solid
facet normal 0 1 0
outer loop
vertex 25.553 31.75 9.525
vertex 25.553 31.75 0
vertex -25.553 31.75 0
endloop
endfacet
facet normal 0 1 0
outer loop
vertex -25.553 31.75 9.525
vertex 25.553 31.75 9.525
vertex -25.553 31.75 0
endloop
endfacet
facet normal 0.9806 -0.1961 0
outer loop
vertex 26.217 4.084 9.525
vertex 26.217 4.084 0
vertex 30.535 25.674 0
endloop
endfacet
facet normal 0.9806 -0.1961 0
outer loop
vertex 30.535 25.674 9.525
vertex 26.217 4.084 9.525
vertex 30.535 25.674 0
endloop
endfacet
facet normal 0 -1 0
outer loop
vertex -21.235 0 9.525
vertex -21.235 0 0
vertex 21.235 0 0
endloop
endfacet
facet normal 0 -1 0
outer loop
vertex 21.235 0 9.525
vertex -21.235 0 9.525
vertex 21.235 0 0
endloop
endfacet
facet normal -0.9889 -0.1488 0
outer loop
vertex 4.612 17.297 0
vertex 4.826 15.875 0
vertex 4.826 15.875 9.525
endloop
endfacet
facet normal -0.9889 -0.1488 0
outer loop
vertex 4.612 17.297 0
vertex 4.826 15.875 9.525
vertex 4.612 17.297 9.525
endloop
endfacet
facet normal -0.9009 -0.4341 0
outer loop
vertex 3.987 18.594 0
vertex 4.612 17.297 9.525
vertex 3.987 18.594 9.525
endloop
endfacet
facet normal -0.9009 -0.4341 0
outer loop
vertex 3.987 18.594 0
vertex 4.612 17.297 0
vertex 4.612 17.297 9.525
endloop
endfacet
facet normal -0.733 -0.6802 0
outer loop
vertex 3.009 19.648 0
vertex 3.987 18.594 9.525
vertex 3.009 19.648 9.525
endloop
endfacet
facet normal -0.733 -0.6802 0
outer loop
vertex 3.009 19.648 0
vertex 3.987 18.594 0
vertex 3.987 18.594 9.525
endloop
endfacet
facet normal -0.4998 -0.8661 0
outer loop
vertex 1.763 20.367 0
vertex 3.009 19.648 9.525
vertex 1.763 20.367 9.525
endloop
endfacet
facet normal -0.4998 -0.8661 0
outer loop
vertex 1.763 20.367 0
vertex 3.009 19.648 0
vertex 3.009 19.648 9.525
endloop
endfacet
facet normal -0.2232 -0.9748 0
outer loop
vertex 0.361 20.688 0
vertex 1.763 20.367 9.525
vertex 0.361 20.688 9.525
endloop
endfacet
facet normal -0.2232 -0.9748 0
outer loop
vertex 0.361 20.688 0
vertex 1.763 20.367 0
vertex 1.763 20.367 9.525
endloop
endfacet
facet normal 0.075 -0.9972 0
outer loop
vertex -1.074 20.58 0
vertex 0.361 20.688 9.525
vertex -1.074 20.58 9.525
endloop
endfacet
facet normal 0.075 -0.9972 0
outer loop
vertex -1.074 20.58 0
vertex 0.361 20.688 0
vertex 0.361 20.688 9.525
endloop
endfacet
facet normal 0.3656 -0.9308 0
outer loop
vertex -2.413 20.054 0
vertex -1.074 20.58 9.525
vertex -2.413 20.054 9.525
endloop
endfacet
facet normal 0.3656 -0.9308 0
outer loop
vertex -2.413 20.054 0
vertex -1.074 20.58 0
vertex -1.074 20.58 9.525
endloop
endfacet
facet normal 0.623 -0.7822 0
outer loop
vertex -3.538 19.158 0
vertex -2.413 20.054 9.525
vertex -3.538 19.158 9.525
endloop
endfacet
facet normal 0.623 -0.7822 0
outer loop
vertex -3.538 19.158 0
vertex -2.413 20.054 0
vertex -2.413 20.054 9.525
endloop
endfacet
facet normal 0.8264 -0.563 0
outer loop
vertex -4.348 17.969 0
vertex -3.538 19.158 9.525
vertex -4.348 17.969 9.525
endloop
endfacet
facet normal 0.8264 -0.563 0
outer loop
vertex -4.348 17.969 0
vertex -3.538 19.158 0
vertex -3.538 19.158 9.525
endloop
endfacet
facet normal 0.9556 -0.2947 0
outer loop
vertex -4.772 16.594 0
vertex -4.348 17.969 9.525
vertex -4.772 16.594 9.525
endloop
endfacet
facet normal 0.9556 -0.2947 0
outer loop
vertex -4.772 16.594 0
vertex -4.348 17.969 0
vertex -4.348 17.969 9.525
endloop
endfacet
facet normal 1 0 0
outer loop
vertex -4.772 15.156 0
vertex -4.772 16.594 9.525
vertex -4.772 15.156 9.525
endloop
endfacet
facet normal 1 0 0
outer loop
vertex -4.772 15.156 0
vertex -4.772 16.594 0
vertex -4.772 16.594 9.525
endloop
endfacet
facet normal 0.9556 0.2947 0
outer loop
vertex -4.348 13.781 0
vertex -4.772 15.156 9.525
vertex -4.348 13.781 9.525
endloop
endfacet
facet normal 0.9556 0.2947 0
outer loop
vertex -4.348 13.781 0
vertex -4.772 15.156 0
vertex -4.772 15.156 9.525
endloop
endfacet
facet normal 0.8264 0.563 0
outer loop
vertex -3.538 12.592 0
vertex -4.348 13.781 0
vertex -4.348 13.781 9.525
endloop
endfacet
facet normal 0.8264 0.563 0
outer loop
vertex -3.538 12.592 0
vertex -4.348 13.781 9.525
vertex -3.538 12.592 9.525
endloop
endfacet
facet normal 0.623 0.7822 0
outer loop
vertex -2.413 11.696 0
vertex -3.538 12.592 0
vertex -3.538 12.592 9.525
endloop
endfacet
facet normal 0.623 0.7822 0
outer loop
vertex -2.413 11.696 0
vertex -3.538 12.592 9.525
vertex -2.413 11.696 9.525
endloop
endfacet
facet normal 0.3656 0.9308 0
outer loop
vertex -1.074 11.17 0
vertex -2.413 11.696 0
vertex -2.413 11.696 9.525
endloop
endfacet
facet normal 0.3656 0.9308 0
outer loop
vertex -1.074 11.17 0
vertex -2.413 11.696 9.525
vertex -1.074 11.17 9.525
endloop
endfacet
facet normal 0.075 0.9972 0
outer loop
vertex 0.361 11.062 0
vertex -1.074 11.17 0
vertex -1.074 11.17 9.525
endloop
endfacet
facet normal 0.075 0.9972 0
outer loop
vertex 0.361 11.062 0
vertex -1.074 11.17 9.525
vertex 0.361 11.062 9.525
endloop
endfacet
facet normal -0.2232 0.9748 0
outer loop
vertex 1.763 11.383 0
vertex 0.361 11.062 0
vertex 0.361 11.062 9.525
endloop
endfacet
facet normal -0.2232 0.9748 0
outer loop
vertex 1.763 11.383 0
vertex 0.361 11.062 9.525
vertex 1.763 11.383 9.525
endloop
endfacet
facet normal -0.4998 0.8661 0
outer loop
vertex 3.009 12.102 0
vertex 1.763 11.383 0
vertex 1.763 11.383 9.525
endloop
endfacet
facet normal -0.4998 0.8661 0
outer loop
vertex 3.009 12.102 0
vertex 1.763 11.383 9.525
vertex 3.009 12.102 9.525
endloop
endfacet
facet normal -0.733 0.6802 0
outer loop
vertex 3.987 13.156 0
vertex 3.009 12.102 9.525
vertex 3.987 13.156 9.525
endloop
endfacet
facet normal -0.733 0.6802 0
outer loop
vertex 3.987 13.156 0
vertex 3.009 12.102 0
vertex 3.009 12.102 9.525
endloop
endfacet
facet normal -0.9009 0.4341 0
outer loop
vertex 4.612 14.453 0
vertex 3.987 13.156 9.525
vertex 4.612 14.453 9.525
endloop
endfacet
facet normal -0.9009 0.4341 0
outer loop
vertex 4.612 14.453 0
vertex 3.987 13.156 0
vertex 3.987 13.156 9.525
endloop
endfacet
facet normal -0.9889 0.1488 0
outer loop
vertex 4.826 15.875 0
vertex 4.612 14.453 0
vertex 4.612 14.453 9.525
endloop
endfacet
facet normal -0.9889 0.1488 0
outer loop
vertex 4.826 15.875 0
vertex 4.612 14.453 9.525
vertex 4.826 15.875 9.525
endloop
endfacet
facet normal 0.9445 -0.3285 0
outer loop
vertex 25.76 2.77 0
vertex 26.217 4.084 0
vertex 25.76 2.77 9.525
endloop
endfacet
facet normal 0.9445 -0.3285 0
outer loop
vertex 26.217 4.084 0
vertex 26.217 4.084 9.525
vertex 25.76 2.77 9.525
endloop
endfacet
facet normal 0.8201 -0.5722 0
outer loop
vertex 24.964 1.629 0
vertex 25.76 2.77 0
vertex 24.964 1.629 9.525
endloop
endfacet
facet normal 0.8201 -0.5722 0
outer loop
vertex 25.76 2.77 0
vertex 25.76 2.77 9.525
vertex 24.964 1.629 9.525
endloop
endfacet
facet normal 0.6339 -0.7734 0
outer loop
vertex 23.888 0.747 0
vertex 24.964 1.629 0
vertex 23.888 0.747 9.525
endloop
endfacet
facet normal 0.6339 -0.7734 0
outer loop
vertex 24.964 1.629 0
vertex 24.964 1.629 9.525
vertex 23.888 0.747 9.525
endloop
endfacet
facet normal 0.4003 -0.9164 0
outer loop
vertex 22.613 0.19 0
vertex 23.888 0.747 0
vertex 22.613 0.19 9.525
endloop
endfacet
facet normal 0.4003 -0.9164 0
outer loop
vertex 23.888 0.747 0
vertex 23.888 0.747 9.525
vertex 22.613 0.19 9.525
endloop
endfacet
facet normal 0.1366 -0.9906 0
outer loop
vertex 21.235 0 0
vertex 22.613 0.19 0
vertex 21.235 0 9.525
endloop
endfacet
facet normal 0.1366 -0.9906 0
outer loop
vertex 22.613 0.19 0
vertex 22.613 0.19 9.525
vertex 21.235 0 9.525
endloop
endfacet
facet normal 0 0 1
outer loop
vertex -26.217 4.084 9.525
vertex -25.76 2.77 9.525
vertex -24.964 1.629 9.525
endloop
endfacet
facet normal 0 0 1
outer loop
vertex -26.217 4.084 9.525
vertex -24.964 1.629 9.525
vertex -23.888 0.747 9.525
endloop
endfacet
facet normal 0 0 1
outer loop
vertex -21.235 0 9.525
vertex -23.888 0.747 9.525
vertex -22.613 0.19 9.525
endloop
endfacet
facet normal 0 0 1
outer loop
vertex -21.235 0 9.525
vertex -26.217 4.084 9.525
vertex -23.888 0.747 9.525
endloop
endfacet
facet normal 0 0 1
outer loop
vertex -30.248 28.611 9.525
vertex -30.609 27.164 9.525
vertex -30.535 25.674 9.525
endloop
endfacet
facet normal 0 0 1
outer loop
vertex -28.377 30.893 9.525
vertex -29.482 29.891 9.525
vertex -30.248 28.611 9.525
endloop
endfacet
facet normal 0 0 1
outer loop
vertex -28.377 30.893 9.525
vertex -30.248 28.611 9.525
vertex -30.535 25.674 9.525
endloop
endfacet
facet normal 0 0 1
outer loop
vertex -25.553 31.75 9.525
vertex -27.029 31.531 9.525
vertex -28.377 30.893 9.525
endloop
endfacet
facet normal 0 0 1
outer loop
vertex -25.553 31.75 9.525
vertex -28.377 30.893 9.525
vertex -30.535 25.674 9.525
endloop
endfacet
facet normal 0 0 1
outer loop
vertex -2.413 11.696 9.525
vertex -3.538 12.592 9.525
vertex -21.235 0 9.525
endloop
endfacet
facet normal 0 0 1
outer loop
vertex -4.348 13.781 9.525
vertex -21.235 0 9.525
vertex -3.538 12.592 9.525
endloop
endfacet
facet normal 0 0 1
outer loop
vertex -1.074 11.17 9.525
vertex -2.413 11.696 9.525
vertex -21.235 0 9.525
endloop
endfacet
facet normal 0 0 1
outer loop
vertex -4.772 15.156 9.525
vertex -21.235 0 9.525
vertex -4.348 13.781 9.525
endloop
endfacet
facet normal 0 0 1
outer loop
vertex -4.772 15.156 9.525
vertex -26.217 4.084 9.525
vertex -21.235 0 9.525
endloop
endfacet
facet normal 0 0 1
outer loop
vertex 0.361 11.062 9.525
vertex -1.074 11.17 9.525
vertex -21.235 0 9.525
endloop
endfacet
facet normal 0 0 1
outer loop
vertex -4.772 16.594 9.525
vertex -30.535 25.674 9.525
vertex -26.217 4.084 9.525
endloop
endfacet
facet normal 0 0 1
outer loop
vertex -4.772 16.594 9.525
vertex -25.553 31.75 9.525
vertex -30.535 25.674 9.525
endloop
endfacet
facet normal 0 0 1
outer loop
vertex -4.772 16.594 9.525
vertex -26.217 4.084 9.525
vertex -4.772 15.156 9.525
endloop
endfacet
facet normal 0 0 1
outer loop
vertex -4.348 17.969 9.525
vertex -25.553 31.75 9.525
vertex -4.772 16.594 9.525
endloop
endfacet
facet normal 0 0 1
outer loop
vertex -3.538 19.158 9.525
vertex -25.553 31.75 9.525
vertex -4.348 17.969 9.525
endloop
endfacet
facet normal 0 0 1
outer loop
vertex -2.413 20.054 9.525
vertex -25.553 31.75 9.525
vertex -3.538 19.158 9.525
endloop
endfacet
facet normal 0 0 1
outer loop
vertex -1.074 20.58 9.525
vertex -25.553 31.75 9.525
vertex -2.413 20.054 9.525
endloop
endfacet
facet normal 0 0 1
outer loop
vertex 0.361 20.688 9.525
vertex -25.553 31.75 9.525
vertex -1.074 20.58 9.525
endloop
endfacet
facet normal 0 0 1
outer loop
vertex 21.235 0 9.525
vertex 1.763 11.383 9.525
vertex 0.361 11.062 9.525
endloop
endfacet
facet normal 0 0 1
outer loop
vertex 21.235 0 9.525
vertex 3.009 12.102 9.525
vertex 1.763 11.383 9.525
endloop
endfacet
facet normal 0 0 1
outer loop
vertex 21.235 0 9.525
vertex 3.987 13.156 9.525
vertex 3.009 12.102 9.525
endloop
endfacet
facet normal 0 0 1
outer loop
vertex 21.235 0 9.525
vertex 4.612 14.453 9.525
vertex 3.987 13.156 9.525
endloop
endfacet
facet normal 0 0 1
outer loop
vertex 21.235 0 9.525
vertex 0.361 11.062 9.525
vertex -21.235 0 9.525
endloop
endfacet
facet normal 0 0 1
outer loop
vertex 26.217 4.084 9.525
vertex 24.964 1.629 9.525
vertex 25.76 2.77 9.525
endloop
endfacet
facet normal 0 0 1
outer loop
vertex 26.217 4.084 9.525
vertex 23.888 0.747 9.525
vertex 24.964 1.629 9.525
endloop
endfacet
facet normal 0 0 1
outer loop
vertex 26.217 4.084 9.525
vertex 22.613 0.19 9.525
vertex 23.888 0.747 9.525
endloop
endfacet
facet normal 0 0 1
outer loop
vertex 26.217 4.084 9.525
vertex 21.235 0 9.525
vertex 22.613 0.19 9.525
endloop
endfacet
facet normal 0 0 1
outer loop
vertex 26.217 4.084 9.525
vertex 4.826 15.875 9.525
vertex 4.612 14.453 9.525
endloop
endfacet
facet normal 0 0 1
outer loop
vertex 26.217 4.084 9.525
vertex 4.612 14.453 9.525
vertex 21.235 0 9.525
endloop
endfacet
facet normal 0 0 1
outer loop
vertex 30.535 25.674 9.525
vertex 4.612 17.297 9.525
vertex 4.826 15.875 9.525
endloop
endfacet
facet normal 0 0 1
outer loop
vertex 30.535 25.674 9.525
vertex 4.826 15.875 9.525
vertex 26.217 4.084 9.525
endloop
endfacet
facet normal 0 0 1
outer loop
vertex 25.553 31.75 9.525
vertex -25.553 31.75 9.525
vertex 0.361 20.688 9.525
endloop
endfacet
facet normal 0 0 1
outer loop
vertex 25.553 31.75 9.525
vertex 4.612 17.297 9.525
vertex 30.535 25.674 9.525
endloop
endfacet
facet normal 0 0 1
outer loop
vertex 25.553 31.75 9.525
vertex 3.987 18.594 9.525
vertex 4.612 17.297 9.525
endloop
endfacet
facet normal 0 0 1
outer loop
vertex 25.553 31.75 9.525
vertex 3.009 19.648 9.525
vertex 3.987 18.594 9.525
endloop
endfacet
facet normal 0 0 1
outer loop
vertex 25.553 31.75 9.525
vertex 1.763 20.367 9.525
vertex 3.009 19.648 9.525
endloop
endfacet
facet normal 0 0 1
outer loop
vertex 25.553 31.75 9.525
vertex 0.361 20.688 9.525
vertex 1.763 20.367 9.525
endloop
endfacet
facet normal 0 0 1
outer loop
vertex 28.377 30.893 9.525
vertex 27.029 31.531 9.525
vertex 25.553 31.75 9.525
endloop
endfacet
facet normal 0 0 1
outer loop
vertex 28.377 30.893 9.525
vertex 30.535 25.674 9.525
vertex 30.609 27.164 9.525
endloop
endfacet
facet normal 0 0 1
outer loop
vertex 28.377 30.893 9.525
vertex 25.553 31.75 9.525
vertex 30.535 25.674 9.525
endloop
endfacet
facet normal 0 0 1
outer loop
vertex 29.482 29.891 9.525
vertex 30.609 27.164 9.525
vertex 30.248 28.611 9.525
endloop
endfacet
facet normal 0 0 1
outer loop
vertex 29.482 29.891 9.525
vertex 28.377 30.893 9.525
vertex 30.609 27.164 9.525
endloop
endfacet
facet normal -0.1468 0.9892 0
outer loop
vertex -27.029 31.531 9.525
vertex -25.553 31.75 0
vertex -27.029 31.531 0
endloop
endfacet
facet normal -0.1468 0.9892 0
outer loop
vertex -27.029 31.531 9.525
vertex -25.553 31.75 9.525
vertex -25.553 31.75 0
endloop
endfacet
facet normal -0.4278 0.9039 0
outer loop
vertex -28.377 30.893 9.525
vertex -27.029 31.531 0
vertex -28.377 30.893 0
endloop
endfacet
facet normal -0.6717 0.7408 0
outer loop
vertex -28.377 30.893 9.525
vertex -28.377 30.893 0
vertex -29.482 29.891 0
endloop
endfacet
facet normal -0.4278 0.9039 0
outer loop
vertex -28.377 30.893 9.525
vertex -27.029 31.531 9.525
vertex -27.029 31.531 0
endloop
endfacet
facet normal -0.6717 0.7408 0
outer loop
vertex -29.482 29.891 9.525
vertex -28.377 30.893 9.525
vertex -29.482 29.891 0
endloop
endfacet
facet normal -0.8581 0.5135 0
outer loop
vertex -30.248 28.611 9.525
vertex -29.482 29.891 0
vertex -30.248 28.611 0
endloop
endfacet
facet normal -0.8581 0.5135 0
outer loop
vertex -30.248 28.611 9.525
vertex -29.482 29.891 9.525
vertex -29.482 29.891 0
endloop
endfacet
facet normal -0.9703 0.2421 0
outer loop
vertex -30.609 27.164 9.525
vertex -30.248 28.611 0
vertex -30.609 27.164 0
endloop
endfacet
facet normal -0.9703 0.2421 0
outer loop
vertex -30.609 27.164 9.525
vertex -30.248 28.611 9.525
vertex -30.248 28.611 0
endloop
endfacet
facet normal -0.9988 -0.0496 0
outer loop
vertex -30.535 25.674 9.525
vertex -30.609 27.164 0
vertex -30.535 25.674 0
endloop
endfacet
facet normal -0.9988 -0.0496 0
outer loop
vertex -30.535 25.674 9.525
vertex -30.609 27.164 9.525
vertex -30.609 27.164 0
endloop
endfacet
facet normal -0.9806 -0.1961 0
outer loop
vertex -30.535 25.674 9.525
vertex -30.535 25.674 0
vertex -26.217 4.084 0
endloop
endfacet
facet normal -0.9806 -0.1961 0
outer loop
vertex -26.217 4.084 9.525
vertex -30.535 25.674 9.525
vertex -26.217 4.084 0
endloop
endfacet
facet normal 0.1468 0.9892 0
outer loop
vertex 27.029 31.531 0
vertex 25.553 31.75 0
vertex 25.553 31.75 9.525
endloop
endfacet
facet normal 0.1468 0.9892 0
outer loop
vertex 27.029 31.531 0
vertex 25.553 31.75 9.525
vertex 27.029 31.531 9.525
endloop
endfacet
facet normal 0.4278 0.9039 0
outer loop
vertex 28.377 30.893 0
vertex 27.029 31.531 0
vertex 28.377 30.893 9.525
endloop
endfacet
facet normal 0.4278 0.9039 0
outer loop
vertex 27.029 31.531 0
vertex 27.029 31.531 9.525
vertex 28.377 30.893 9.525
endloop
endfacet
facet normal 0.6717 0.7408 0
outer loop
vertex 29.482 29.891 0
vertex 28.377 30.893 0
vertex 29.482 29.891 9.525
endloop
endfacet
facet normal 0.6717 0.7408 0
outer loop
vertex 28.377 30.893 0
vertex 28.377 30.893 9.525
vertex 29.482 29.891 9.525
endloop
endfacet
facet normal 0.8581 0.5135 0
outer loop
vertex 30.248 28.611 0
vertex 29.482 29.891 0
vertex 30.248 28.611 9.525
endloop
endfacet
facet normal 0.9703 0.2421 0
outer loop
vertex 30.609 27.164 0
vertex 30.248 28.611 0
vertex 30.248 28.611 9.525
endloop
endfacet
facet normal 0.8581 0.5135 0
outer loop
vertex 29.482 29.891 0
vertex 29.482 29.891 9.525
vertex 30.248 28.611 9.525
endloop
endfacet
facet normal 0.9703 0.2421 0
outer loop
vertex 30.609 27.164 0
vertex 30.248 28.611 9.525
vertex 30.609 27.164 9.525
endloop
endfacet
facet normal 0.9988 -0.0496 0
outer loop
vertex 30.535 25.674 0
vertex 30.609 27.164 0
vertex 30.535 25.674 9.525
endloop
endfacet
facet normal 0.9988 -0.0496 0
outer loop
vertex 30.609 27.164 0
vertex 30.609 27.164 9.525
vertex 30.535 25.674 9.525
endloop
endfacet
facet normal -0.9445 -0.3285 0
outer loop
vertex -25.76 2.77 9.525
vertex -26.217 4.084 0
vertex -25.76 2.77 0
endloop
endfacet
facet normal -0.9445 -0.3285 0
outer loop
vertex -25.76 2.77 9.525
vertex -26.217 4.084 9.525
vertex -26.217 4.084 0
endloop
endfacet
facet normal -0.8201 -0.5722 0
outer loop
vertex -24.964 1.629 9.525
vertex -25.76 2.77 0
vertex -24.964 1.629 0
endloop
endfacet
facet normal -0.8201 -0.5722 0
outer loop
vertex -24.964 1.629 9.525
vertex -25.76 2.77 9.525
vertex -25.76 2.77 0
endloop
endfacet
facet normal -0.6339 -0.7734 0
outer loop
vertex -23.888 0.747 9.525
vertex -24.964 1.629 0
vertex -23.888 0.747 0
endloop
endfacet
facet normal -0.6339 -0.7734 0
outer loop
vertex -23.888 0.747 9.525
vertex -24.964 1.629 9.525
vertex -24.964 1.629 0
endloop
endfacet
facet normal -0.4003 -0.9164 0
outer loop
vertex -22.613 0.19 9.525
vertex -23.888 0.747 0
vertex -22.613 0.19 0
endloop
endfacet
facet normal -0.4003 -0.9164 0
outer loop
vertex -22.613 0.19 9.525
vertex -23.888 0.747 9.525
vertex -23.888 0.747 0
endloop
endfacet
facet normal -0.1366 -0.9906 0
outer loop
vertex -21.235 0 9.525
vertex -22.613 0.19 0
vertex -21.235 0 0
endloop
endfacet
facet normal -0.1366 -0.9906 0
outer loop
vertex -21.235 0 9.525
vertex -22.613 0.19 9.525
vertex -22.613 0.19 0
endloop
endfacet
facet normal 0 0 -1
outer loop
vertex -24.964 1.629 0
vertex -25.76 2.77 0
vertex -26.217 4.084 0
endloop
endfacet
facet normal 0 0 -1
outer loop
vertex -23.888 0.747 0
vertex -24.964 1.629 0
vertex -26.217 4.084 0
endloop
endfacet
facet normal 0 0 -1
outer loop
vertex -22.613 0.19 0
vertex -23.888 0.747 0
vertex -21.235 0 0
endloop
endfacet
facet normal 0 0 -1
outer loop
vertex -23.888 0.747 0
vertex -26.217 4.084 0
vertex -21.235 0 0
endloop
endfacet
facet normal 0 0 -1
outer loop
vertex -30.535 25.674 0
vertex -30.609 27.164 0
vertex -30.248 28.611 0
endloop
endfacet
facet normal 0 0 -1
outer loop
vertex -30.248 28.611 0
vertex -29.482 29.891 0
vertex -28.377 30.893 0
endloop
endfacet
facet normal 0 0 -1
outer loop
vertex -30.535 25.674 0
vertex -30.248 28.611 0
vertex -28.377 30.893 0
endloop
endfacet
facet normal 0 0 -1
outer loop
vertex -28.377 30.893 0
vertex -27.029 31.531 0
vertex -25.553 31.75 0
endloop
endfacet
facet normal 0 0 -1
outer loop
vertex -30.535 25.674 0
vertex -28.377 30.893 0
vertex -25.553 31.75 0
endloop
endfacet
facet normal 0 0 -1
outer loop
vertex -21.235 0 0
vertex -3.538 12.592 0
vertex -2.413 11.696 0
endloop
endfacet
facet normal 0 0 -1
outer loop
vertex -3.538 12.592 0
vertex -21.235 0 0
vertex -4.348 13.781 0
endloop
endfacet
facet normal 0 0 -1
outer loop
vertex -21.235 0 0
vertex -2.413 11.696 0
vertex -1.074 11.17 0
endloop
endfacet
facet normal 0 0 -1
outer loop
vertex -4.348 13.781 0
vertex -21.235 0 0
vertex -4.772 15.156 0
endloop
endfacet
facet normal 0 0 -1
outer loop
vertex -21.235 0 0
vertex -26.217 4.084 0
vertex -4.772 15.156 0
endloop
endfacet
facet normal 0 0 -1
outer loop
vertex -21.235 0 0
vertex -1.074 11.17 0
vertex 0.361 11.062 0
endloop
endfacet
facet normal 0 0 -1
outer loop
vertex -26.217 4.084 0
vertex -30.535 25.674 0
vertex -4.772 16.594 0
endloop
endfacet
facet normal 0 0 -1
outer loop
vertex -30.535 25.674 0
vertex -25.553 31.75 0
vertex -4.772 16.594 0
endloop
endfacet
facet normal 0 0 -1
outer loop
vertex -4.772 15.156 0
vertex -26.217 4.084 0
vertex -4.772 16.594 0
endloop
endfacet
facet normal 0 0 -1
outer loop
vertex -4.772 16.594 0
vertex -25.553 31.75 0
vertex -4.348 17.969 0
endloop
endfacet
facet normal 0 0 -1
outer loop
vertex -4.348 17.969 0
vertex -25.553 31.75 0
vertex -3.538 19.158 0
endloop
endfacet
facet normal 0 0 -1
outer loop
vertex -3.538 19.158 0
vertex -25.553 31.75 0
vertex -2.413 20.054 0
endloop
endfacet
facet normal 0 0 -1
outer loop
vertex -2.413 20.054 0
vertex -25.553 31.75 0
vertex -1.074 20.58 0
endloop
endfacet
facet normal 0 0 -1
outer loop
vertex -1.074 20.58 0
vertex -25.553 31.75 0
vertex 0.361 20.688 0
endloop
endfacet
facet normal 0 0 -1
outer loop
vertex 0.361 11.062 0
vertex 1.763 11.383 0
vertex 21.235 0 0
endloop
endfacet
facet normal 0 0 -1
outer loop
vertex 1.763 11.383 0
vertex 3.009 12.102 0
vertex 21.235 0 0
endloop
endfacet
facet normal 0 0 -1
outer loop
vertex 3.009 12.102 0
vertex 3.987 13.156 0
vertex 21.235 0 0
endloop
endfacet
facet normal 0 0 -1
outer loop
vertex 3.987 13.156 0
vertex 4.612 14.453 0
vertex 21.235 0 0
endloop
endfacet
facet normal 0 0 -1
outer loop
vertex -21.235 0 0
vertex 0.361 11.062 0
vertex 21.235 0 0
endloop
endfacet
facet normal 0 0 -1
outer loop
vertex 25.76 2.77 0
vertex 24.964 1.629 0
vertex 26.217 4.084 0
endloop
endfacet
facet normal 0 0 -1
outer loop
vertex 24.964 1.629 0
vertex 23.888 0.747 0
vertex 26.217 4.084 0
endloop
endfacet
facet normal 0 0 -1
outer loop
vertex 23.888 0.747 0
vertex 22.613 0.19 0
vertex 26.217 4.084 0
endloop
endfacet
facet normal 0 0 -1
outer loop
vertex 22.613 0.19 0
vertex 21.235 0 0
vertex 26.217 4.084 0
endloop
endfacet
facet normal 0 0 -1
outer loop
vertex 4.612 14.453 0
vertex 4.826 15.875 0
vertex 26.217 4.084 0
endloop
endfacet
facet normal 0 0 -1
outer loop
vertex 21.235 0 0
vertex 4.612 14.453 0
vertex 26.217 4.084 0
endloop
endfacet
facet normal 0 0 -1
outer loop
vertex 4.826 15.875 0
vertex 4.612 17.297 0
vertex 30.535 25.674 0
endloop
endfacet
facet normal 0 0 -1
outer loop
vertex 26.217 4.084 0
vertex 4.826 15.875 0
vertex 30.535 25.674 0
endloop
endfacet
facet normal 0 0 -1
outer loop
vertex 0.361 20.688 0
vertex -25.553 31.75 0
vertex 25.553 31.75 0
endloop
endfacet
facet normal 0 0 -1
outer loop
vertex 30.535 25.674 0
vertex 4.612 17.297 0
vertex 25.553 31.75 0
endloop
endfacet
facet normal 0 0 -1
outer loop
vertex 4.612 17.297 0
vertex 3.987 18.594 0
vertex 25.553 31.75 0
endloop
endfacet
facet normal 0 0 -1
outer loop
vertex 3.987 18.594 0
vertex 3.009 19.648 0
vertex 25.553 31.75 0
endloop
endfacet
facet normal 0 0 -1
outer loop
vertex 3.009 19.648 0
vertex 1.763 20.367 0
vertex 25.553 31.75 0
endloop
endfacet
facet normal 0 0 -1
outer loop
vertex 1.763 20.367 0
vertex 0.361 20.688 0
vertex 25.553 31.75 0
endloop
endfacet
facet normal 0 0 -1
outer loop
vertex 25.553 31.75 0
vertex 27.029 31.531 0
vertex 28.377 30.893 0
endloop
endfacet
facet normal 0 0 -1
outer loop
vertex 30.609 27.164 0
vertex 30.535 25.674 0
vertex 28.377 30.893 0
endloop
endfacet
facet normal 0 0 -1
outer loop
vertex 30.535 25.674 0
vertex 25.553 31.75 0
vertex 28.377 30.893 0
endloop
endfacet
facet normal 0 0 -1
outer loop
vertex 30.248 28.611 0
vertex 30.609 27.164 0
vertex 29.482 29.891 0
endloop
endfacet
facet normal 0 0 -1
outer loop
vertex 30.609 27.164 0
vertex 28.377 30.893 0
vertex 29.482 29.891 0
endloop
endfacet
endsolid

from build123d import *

# Parameters (mm, degrees)
F2_DEPTH = 9.525
F1_R     = 4.826
F3_DEPTH = 9.525
F4_R     = 5.08


with BuildPart() as f2:
    # F0 (on Top) → F2 (new body)
    with BuildSketch(Plane.XY):
        Polygon((31.75, 31.75), (0, 31.75), (-31.75, 31.75), (-25.4, 0), (0, 0), (25.4, 0), align=None)
    extrude(amount=F2_DEPTH)

    # F1 (on face) → F3 (cut, through all)
    with BuildSketch(Plane.XY):
        with Locations((0, 15.875)):
            Circle(F1_R)
    extrude(amount=F3_DEPTH, mode=Mode.SUBTRACT)

    # F4
    f4_edges = [f2.edges().sort_by_distance(p)[0] for p in [
        (-31.75, 31.75, 4.7625),
        (31.75, 31.75, 4.7625),
        (25.4, 0, 4.7625),
        (-25.4, 0, 4.7625),
    ]]
    fillet(f4_edges, radius=F4_R)


solid = f2.part
